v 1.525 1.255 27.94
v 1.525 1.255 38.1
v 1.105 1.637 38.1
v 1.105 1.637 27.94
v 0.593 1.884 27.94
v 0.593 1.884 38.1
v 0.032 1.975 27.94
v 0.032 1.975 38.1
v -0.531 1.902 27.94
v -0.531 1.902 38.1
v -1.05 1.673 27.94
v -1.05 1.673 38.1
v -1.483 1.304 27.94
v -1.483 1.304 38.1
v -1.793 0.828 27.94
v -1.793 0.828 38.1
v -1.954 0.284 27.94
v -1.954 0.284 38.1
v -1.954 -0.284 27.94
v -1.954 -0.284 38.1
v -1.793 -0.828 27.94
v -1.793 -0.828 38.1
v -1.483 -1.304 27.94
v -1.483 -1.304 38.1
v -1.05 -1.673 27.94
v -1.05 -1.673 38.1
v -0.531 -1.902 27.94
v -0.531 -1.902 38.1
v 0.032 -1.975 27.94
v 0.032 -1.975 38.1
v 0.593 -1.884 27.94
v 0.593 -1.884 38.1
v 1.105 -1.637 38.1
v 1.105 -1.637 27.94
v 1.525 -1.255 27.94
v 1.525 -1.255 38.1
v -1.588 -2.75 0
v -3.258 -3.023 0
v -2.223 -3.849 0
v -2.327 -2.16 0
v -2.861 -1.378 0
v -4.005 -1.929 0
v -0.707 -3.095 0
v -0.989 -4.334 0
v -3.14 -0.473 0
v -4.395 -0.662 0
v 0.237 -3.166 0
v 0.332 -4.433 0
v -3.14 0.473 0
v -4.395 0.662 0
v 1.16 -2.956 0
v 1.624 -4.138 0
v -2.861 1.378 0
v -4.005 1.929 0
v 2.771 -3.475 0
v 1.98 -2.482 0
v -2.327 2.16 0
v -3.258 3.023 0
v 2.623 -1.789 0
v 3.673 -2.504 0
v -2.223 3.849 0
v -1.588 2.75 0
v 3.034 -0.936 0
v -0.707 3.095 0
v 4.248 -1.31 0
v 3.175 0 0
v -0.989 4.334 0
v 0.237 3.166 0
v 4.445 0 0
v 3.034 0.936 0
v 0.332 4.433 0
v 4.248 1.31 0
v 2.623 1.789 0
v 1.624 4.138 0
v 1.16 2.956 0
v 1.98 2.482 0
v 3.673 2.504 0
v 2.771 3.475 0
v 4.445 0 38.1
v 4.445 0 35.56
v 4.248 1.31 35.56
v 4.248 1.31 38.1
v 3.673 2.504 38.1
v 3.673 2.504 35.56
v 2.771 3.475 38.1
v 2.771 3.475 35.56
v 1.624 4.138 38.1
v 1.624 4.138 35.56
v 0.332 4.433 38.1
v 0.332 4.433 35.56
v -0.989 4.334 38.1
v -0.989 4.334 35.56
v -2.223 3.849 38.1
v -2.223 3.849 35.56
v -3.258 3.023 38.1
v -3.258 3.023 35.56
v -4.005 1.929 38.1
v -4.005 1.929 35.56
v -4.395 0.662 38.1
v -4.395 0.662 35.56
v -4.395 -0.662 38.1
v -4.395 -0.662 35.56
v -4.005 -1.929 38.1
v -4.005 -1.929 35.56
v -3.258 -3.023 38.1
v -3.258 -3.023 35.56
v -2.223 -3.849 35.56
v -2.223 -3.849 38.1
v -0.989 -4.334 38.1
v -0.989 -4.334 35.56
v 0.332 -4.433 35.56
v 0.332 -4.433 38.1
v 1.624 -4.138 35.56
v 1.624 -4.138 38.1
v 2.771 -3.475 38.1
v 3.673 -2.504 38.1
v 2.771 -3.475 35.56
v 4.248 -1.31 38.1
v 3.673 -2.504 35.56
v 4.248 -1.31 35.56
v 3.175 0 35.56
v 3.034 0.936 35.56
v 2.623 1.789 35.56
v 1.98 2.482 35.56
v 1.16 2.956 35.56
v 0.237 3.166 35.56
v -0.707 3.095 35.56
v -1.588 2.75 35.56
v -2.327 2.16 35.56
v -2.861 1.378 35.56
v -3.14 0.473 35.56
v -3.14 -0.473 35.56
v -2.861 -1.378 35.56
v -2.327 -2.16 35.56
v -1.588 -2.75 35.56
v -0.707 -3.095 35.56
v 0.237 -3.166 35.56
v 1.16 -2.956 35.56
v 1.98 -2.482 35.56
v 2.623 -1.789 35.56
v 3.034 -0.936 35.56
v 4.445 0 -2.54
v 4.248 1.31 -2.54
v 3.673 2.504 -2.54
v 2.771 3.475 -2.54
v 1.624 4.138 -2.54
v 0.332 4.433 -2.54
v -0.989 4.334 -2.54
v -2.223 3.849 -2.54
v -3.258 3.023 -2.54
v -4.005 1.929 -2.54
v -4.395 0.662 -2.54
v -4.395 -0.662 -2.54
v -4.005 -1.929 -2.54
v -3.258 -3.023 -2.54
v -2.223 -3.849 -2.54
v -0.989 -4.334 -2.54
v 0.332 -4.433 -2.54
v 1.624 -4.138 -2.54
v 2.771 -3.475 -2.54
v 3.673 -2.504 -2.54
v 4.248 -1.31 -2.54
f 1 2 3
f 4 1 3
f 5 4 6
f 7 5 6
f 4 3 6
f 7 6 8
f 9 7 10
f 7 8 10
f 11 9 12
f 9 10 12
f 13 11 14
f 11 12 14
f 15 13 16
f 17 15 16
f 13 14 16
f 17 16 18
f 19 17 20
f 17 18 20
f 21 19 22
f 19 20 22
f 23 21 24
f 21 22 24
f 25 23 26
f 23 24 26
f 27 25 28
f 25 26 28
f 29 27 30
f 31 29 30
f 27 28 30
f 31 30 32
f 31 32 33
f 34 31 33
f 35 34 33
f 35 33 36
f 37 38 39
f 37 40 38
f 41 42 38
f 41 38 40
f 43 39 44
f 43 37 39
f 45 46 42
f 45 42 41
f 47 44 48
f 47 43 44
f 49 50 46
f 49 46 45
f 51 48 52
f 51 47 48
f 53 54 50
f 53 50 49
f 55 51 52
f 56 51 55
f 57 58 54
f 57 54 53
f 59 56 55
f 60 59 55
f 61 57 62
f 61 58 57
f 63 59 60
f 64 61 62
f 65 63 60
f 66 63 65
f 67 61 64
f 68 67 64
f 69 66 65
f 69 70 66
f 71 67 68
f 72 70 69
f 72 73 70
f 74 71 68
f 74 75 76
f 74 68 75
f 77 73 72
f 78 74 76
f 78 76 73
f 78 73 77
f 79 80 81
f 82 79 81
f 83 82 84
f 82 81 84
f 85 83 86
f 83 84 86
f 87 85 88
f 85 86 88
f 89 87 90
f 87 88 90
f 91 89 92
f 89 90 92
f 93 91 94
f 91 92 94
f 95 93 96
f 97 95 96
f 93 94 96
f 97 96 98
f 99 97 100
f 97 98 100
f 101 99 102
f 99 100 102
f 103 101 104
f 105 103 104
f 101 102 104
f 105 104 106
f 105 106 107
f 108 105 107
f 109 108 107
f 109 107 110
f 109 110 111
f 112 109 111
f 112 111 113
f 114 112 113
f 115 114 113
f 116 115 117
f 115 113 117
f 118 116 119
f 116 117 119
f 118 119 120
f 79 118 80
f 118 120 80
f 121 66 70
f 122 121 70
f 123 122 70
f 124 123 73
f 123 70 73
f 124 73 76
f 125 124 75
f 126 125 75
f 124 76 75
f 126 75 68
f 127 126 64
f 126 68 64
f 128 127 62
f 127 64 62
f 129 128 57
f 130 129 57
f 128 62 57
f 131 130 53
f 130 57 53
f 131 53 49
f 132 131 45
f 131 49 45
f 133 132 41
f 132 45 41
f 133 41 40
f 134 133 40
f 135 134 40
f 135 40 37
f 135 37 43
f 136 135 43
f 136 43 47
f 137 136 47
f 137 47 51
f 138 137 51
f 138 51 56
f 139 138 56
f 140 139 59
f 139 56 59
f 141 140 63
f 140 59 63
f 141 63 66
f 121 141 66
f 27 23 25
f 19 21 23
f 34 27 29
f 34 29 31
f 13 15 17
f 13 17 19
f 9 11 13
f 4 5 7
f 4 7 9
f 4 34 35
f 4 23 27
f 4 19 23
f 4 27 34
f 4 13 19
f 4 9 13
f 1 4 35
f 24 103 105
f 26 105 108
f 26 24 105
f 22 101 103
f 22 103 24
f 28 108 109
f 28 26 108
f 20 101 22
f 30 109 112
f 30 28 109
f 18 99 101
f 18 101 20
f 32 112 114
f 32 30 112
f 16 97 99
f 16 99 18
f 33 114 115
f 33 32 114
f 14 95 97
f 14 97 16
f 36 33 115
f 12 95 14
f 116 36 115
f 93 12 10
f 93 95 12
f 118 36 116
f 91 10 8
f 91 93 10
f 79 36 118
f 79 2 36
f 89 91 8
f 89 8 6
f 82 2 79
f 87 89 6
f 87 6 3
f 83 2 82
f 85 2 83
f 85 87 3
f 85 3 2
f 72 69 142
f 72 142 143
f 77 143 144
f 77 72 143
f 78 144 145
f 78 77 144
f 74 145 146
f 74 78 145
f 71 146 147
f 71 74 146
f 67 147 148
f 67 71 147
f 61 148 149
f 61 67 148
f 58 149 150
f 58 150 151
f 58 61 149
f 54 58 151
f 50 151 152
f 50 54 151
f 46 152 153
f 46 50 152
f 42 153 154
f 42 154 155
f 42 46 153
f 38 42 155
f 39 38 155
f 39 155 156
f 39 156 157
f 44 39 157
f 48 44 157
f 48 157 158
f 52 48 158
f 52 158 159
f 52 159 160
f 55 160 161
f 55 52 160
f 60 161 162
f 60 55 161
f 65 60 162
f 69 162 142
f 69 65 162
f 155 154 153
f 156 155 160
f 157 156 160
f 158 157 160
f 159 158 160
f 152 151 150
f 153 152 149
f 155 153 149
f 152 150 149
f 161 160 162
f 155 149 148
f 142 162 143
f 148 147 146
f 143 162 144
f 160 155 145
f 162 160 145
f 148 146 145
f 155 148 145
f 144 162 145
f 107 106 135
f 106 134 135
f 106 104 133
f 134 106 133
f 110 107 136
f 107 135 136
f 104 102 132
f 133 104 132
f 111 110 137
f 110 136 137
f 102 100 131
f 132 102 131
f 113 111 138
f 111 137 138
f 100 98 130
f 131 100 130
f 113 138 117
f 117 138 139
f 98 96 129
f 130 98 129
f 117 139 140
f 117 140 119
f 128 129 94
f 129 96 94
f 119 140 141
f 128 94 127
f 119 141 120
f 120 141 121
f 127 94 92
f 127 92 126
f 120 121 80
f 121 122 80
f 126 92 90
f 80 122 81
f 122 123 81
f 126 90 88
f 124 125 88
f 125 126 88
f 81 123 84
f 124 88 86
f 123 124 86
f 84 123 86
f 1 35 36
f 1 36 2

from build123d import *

# Parameters (mm, degrees)
SKETCH1_R           = 3.175
BOSS_EXTRUDE1_DEPTH = 35.56
SKETCH3_R           = 4.445
BOSS_EXTRUDE2_DEPTH = 2.54
CUT_EXTRUDE1_DEPTH  = 10.16


with BuildPart() as part:
    # Sketch1 → Boss-Extrude1 (new body)
    with BuildSketch(Plane.XY):
        Circle(SKETCH1_R)
    extrude(amount=BOSS_EXTRUDE1_DEPTH)

    # Sketch3 → Boss-Extrude2 (add)
    with BuildSketch(Plane.XY.offset(35.56)):
        Circle(SKETCH3_R)
    boss_extrude2 = extrude(amount=BOSS_EXTRUDE2_DEPTH)

    # Mirror1: Boss-Extrude2 across plane
    add(boss_extrude2.mirror(Plane.XY.offset(17.78)))

    # Sketch4 → Cut-Extrude1 (cut)
    with BuildSketch(Plane.XY.offset(38.1)):
        with BuildLine():
            Line((1.525, 0), (1.525, 1.25499004))
            ThreePointArc((1.525, 1.25499004), (-1.975, 0), (1.525, -1.25499004))
            Line((1.525, -1.25499004), (1.525, 0))
        make_face()
    extrude(amount=-CUT_EXTRUDE1_DEPTH, mode=Mode.SUBTRACT)


solid = part.part
